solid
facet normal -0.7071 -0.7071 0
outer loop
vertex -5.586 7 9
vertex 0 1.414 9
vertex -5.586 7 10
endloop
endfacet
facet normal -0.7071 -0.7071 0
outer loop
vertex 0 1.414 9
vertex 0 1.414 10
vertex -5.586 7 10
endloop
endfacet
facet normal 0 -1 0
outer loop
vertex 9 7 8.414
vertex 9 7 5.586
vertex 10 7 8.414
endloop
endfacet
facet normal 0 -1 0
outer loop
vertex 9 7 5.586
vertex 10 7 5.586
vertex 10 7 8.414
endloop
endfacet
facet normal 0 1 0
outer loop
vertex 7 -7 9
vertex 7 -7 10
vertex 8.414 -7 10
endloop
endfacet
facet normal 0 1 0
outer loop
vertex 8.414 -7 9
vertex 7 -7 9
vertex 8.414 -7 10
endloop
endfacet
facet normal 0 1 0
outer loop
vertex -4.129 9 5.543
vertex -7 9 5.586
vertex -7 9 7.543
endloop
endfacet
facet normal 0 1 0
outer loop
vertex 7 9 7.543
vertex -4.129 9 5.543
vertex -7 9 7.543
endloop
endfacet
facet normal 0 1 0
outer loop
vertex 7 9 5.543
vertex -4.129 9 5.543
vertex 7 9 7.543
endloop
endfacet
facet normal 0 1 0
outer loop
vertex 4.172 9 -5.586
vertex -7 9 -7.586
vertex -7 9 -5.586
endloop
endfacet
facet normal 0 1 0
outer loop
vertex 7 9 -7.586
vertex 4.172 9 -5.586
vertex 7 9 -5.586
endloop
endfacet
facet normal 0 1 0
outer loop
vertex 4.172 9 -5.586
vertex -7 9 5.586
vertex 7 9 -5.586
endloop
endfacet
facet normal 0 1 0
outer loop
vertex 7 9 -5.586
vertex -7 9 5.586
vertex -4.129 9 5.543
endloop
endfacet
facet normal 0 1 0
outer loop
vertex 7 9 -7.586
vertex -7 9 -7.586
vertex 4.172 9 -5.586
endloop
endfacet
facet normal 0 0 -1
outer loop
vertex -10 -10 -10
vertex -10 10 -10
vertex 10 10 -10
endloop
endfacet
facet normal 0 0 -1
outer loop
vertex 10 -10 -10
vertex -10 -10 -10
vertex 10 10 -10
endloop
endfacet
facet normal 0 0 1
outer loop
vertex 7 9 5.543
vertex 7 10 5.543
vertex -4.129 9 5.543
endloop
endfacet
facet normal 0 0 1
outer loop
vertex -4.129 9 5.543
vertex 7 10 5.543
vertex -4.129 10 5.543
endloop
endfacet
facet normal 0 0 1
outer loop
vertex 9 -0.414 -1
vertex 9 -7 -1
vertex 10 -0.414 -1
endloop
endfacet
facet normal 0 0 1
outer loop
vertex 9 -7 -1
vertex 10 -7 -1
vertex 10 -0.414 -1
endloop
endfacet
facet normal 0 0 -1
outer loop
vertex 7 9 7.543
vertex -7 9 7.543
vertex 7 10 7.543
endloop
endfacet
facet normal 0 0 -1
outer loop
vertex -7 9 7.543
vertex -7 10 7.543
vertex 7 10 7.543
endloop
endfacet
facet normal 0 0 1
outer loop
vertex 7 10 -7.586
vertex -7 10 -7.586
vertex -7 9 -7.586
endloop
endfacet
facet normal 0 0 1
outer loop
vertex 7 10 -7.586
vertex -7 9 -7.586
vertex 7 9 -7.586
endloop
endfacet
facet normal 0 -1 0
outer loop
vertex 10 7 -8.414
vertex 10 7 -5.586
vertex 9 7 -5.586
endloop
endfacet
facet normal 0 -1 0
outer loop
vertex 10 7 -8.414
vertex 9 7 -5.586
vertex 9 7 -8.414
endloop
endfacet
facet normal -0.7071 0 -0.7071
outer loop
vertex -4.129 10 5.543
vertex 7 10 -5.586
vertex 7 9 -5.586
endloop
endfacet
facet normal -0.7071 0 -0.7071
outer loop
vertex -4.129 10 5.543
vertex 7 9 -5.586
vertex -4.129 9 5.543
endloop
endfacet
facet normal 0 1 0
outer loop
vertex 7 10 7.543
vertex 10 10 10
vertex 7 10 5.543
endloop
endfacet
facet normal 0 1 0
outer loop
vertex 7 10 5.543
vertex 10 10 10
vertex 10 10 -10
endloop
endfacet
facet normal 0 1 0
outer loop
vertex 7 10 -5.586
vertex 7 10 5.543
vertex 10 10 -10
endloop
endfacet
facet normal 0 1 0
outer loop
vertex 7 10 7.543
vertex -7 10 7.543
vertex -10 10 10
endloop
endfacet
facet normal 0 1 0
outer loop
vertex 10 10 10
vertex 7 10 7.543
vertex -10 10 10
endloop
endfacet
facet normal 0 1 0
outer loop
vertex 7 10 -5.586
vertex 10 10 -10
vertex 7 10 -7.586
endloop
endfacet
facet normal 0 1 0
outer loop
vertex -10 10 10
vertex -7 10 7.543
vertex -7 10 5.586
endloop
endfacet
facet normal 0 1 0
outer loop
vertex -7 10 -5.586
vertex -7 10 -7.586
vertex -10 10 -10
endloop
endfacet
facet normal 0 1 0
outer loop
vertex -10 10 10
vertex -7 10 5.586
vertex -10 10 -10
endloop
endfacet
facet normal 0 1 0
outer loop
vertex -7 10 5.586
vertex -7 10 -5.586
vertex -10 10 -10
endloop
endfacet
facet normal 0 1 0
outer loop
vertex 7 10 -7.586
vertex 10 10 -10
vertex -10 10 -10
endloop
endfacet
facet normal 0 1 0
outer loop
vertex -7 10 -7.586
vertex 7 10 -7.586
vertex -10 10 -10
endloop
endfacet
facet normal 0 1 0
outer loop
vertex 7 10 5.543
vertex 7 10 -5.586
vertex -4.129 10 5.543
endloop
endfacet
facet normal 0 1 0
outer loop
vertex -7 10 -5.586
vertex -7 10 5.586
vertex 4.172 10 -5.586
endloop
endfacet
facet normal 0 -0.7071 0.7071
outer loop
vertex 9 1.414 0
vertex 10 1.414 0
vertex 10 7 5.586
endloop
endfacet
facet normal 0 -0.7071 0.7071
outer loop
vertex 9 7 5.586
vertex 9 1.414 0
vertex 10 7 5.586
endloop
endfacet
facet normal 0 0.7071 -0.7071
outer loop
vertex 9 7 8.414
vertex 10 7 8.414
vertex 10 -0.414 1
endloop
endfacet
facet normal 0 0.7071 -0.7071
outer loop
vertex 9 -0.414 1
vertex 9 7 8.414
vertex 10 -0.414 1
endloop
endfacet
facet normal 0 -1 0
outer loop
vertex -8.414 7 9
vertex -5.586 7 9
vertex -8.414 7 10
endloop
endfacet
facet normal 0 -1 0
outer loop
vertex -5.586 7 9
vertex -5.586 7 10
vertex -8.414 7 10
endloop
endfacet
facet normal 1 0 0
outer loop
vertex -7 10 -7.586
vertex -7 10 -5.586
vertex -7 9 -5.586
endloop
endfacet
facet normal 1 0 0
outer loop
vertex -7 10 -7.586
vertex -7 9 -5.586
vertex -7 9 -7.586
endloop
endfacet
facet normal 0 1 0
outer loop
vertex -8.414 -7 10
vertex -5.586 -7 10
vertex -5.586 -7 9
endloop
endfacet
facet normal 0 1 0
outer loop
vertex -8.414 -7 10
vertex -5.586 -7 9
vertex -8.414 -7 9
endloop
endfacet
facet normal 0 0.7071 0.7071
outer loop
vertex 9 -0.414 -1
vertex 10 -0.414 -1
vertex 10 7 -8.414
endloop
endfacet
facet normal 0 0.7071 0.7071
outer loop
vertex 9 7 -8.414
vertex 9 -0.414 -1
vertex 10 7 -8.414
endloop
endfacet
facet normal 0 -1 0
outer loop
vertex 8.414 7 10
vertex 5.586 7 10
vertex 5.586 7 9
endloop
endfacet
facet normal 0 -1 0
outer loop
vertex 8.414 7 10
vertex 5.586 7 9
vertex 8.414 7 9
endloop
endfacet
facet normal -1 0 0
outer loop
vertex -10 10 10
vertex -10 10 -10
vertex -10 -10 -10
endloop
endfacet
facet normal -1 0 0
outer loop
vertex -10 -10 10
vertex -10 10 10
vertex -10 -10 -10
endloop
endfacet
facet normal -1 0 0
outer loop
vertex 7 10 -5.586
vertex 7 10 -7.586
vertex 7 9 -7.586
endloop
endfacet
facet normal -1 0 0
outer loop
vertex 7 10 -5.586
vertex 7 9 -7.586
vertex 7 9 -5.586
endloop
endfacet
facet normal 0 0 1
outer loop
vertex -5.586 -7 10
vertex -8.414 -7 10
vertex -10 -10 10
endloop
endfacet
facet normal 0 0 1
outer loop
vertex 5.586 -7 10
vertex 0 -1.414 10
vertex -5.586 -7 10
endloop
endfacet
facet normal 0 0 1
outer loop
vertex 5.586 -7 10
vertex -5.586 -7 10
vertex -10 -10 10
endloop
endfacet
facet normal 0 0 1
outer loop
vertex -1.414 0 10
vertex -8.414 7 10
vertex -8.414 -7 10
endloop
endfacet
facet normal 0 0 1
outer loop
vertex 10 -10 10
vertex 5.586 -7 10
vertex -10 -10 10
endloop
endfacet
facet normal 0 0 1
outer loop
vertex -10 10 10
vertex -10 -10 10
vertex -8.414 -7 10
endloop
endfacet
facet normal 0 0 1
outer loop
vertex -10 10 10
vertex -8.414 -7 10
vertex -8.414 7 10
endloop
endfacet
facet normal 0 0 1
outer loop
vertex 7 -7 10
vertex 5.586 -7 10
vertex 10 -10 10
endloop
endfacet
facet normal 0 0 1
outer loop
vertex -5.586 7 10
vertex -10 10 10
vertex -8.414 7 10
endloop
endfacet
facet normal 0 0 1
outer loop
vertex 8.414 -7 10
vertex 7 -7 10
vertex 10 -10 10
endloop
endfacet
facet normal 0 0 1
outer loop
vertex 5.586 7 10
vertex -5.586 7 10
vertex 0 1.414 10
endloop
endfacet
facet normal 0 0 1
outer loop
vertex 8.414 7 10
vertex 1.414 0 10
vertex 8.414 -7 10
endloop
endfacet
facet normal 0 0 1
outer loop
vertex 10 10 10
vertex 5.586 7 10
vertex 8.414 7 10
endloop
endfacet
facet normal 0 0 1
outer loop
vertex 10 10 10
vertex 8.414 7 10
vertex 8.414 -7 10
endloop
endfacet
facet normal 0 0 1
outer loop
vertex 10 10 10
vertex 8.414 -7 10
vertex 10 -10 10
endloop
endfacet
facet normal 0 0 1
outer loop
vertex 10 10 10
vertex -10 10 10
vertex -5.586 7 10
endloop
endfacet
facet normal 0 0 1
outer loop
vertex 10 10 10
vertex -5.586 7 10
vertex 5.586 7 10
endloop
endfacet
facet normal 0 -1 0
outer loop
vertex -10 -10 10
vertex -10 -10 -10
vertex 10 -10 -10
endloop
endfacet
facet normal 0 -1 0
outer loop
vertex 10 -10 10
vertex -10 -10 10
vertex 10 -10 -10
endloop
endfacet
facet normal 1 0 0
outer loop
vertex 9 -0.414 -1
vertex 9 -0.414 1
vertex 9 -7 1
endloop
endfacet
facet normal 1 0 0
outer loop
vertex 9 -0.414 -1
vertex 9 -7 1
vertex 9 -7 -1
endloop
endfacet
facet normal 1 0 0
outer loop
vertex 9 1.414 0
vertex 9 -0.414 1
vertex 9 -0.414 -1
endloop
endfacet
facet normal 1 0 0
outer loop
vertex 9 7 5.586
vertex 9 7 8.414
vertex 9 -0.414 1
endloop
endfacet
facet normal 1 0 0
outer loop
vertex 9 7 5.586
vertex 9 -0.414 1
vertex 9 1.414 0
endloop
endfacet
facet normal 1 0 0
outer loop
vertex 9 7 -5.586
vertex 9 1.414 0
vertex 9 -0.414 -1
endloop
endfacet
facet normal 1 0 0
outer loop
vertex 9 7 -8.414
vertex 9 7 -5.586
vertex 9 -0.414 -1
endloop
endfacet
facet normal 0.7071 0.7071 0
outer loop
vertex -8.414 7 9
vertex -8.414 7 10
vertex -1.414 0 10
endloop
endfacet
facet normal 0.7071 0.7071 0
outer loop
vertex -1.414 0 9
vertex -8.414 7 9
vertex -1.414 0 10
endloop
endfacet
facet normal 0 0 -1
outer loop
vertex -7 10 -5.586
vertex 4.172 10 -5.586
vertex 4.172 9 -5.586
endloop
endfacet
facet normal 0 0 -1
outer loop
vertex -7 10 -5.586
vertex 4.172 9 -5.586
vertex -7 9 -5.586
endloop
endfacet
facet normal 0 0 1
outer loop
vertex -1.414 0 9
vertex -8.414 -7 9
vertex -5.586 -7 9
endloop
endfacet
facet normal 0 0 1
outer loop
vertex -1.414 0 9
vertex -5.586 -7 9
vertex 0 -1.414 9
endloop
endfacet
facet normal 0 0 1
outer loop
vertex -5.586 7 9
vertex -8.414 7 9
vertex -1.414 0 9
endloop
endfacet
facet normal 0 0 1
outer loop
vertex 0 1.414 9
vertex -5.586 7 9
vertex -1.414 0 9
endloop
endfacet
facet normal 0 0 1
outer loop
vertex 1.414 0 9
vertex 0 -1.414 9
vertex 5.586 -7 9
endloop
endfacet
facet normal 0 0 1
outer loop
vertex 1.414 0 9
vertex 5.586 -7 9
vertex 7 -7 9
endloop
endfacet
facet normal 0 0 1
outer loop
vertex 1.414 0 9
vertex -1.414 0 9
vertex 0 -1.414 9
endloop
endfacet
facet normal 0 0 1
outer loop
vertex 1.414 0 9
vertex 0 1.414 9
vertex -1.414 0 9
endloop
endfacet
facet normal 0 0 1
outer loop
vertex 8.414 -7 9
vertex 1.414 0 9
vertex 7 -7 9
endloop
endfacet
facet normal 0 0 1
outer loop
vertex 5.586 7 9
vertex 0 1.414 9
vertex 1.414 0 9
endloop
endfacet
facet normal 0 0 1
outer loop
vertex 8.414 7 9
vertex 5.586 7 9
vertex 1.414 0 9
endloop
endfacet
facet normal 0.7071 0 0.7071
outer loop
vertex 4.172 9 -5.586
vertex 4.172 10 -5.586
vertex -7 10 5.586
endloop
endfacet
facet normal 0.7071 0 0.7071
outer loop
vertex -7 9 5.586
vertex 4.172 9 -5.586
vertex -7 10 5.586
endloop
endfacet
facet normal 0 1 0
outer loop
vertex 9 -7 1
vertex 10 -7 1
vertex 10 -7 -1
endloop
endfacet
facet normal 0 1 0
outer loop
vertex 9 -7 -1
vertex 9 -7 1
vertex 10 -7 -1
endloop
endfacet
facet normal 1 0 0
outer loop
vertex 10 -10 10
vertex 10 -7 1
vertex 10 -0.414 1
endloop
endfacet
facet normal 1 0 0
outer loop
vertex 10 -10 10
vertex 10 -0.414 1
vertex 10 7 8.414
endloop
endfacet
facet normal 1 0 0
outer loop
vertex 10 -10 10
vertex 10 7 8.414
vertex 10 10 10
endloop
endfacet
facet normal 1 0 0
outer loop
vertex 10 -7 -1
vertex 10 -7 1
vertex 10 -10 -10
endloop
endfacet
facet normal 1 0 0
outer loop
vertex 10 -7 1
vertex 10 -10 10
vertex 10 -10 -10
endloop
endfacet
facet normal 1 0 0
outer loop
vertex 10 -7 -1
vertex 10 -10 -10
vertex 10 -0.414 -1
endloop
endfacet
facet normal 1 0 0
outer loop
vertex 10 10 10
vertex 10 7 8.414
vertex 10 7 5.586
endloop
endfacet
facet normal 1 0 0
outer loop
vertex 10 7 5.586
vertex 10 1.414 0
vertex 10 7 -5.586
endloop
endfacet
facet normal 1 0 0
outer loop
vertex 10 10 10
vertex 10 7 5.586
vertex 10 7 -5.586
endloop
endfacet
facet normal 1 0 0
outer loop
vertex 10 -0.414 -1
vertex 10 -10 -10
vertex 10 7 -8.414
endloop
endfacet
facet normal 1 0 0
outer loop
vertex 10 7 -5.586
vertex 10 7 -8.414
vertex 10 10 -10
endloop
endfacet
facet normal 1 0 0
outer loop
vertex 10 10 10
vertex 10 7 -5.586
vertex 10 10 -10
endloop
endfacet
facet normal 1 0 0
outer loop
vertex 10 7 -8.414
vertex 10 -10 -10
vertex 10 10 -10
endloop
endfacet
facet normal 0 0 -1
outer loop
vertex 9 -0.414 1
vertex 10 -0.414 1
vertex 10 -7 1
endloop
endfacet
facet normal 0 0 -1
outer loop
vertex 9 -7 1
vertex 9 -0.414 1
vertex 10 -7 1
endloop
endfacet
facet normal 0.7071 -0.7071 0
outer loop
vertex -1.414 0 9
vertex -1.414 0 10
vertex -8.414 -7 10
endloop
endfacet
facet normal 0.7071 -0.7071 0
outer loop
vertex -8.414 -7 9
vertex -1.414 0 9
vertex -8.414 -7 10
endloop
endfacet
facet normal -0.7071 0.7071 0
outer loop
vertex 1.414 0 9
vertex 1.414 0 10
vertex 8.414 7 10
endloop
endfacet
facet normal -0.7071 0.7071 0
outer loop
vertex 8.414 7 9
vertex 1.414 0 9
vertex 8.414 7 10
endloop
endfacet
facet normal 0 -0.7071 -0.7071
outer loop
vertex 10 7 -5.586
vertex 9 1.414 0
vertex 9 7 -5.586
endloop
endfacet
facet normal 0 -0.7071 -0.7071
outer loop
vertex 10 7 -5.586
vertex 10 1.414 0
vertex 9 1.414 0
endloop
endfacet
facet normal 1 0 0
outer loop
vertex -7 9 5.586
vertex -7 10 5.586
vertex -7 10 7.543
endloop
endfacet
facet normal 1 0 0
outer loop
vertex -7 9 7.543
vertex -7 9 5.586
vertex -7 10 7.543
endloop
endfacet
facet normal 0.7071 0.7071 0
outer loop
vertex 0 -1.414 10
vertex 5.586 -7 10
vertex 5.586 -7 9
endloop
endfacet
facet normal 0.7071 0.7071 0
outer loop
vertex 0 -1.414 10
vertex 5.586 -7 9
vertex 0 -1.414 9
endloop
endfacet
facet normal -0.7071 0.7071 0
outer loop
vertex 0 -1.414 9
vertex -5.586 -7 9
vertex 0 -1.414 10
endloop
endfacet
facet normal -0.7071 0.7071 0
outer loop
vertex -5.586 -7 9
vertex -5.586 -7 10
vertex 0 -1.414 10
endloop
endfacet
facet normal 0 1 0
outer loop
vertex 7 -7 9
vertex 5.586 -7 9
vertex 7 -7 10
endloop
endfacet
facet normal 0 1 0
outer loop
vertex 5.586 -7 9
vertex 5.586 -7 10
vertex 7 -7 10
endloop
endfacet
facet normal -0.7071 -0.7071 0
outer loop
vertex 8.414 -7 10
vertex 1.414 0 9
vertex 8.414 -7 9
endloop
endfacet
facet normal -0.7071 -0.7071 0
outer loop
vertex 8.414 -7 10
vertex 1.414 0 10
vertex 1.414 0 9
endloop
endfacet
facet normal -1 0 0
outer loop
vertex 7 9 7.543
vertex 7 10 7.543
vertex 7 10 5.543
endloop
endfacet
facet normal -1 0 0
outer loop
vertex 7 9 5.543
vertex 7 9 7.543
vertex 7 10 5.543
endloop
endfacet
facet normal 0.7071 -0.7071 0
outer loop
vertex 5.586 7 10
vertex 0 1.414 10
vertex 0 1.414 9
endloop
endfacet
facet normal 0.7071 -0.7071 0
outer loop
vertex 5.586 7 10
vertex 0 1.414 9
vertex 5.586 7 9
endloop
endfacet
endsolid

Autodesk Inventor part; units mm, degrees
ref_plane "YZ Plane" through (0, 0, 0) normal (1, 0, 0) x (0, 1, 0)
ref_plane "XZ Plane" through (0, 0, 0) normal (0, 1, 0) x (-1, 0, 0)
ref_plane "XY Plane" through (0, 0, 0) normal (0, 0, 1) x (1, 0, 0)
sketch "Esboço1" plane through (0, 0, 0) normal (0, 0, 1) x (1, 0, 0)
  line L0 (-10, -10) -> (10, -10)
  line L1 (10, -10) -> (10, 10)
  line L2 (10, 10) -> (-10, 10)
  line L3 (-10, 10) -> (-10, -10)
  line L4 (-10, -10) -> (10, 10) construction
  line L5 (10, -10) -> (-10, 10) construction
  point P0 (0, 0)
  dimension "d0" = 20
  dimension "d1" = 20
extrude "Extrusão1" add sketch "Esboço1" along normal mid plane 20
sketch "Esboço4" plane through (0, 0, 10) normal (0, 0, 1) x (1, 0, 0)
  line L0 (-7, -7) -> (7, -7) construction
  line L1 (7, -7) -> (7, 7) construction
  line L2 (7, 7) -> (-7, 7) construction
  line L3 (-7, 7) -> (-7, -7) construction
  line L4 (0, 1.4142) -> (-1.4142, 0)
  line L5 (-1.4142, 0) -> (0, -1.4142)
  line L6 (0, -1.4142) -> (1.4142, 0)
  line L7 (1.4142, 0) -> (0, 1.4142)
  line L8 (0, 1.4142) -> (0, -1.4142) construction
  line L9 (-1.4142, 0) -> (1.4142, 0) construction
  line L10 (0, -1.4142) -> (1.4142, 0)
  line L11 (1.4142, 0) -> (7.0002, -5.586)
  line L12 (5.586, -7.0002) -> (0, -1.4142)
  line L13 (0, -1.4142) -> (-1.4142, 0)
  line L14 (-1.4142, 0) -> (-7.0001, -5.5859)
  line L15 (-5.5859, -7.0001) -> (0, -1.4142)
  line L16 (-1.4142, 0) -> (0, 1.4142)
  line L17 (0, 1.4142) -> (-5.5858, 7)
  line L18 (-7, 5.5858) -> (-1.4142, 0)
  line L19 (1.4142, 0) -> (0, 1.4142)
  line L20 (0, 1.4142) -> (5.5858, 7)
  line L21 (7, 5.5858) -> (1.4142, 0)
  line L22 (-8.4142, 7) -> (-7, 5.5858)
  line L23 (7, 5.5858) -> (8.4142, 7)
  line L24 (8.4142, -7) -> (7, -5.5858)
  line L25 (-7, -5.5858) -> (-8.4142, -7)
  line L26 (-5.5858, -7) -> (-8.4142, -7)
  line L27 (5.5858, -7) -> (7, -7)
  line L28 (7, -7) -> (8.4142, -7)
  line L29 (-5.5858, 7) -> (-8.4142, 7)
  line L30 (5.5858, 7) -> (7, 7)
  line L31 (7, 7) -> (8.4142, 7)
  point P0 (0, 0)
  point P1 (0, 0)
  point P2 (-7, 7)
  point P3 (-7, -7)
  point P4 (6.2929, 7)
  point P5 (7.7071, -7)
  dimension "d62" = 2
  dimension "d63" = 2
  dimension "d64" = 14
  dimension "d65" = 14
  dimension "d68" = 2
  dimension "d69" = 2
  dimension "d70" = 2
  dimension "d71" = 2
extrude "Extrusão4" cut sketch "Esboço4" against normal blind 1
sketch "Esboço7" plane through (10, -10, 10) normal (1, 0, 0) x (0, 0, -1)
  line L0 (17, 3) -> (3, 3) construction
  line L1 (3, 3) -> (3, 17) construction
  line L2 (3, 17) -> (17, 17) construction
  line L3 (17, 17) -> (17, 3) construction
  line L4 (8.5858, 10) -> (10, 11.4142) construction
  line L5 (10, 11.4142) -> (11.4142, 10) construction
  line L6 (11.4142, 10) -> (11, 9.5858) construction
  line L7 (9, 9.5858) -> (8.5858, 10) construction
  line L8 (8.5858, 10) -> (11.4142, 10) construction
  line L9 (10, 11.4142) -> (10, 8.5858) construction
  line L10 (10, 11.4142) -> (4.4142, 17)
  line L11 (3, 15.5858) -> (8.5858, 10)
  line L12 (10, 11.4142) -> (15.5858, 17)
  line L13 (17, 15.5858) -> (11.4142, 10)
  line L14 (18.4142, 17) -> (17, 15.5858) construction
  line L15 (15.5858, 17) -> (18.4142, 17) construction
  line L16 (3, 15.5858) -> (1.5858, 17) construction
  line L17 (1.5858, 17) -> (4.4142, 17) construction
  line L18 (4.4142, 17) -> (1.5858, 17)
  line L19 (3, 15.5858) -> (1.5858, 17)
  line L20 (15.5858, 17) -> (18.4142, 17)
  line L21 (17, 15.5858) -> (18.4142, 17)
  line L22 (8.5858, 10) -> (9, 9.5858)
  line L23 (11.4142, 10) -> (11, 9.5858)
  line L24 (9, 3) -> (11, 3)
  line L25 (11, 3) -> (11, 9.5858)
  line L26 (9, 9.5858) -> (9, 3)
  line L27 (8.5858, 10) -> (10, 8.5858) construction
  line L28 (10, 8.5858) -> (11.4142, 10) construction
  point P0 (10, 10)
  point P1 (4.4142, 17)
  point P2 (8.7929, 9.7929)
extrude "Extrusão7" cut sketch "Esboço7" against normal blind 1
sketch "Esboço8" plane through (-10, 10, 10) normal (0, 1, 0) x (1, 0, 0)
  line L0 (17, 17.5858) -> (3, 17.5858) construction
  line L1 (10, 11.4142) -> (8.5858, 10) construction
  line L2 (8.5858, 10) -> (10, 8.5858) construction
  line L3 (10, 8.5858) -> (11.4142, 10) construction
  line L4 (11.4142, 10) -> (10, 11.4142) construction
  line L5 (10, 11.4142) -> (10, 8.5858) construction
  line L6 (8.5858, 10) -> (11.4142, 10) construction
  line L7 (11.4142, 10) -> (17, 15.5858)
  line L8 (14.1716, 15.5858) -> (10, 11.4142)
  line L9 (8.5858, 10) -> (3, 4.4142)
  line L10 (5.8712, 4.457) -> (10, 8.5858)
  line L11 (10, 11.4142) -> (8.5858, 10)
  line L12 (11.4142, 10) -> (10, 8.5858)
  line L13 (3, 4.4142) -> (3, 2.457)
  line L14 (17, 2.457) -> (17, 4.457)
  line L15 (17, 4.457) -> (5.8712, 4.457)
  line L16 (17, 17.5858) -> (17, 15.5858)
  line L17 (14.1716, 15.5858) -> (3, 15.5858)
  line L18 (3, 15.5858) -> (3, 17.5858)
  line L19 (3, 17.5858) -> (17, 17.5858)
  line L20 (3, 2.457) -> (17, 2.457)
  point P0 (10, 10)
extrude "Extrusão8" cut sketch "Esboço8" against normal blind 1
properties part number "Cubo-0001-002" material "Borracha"
